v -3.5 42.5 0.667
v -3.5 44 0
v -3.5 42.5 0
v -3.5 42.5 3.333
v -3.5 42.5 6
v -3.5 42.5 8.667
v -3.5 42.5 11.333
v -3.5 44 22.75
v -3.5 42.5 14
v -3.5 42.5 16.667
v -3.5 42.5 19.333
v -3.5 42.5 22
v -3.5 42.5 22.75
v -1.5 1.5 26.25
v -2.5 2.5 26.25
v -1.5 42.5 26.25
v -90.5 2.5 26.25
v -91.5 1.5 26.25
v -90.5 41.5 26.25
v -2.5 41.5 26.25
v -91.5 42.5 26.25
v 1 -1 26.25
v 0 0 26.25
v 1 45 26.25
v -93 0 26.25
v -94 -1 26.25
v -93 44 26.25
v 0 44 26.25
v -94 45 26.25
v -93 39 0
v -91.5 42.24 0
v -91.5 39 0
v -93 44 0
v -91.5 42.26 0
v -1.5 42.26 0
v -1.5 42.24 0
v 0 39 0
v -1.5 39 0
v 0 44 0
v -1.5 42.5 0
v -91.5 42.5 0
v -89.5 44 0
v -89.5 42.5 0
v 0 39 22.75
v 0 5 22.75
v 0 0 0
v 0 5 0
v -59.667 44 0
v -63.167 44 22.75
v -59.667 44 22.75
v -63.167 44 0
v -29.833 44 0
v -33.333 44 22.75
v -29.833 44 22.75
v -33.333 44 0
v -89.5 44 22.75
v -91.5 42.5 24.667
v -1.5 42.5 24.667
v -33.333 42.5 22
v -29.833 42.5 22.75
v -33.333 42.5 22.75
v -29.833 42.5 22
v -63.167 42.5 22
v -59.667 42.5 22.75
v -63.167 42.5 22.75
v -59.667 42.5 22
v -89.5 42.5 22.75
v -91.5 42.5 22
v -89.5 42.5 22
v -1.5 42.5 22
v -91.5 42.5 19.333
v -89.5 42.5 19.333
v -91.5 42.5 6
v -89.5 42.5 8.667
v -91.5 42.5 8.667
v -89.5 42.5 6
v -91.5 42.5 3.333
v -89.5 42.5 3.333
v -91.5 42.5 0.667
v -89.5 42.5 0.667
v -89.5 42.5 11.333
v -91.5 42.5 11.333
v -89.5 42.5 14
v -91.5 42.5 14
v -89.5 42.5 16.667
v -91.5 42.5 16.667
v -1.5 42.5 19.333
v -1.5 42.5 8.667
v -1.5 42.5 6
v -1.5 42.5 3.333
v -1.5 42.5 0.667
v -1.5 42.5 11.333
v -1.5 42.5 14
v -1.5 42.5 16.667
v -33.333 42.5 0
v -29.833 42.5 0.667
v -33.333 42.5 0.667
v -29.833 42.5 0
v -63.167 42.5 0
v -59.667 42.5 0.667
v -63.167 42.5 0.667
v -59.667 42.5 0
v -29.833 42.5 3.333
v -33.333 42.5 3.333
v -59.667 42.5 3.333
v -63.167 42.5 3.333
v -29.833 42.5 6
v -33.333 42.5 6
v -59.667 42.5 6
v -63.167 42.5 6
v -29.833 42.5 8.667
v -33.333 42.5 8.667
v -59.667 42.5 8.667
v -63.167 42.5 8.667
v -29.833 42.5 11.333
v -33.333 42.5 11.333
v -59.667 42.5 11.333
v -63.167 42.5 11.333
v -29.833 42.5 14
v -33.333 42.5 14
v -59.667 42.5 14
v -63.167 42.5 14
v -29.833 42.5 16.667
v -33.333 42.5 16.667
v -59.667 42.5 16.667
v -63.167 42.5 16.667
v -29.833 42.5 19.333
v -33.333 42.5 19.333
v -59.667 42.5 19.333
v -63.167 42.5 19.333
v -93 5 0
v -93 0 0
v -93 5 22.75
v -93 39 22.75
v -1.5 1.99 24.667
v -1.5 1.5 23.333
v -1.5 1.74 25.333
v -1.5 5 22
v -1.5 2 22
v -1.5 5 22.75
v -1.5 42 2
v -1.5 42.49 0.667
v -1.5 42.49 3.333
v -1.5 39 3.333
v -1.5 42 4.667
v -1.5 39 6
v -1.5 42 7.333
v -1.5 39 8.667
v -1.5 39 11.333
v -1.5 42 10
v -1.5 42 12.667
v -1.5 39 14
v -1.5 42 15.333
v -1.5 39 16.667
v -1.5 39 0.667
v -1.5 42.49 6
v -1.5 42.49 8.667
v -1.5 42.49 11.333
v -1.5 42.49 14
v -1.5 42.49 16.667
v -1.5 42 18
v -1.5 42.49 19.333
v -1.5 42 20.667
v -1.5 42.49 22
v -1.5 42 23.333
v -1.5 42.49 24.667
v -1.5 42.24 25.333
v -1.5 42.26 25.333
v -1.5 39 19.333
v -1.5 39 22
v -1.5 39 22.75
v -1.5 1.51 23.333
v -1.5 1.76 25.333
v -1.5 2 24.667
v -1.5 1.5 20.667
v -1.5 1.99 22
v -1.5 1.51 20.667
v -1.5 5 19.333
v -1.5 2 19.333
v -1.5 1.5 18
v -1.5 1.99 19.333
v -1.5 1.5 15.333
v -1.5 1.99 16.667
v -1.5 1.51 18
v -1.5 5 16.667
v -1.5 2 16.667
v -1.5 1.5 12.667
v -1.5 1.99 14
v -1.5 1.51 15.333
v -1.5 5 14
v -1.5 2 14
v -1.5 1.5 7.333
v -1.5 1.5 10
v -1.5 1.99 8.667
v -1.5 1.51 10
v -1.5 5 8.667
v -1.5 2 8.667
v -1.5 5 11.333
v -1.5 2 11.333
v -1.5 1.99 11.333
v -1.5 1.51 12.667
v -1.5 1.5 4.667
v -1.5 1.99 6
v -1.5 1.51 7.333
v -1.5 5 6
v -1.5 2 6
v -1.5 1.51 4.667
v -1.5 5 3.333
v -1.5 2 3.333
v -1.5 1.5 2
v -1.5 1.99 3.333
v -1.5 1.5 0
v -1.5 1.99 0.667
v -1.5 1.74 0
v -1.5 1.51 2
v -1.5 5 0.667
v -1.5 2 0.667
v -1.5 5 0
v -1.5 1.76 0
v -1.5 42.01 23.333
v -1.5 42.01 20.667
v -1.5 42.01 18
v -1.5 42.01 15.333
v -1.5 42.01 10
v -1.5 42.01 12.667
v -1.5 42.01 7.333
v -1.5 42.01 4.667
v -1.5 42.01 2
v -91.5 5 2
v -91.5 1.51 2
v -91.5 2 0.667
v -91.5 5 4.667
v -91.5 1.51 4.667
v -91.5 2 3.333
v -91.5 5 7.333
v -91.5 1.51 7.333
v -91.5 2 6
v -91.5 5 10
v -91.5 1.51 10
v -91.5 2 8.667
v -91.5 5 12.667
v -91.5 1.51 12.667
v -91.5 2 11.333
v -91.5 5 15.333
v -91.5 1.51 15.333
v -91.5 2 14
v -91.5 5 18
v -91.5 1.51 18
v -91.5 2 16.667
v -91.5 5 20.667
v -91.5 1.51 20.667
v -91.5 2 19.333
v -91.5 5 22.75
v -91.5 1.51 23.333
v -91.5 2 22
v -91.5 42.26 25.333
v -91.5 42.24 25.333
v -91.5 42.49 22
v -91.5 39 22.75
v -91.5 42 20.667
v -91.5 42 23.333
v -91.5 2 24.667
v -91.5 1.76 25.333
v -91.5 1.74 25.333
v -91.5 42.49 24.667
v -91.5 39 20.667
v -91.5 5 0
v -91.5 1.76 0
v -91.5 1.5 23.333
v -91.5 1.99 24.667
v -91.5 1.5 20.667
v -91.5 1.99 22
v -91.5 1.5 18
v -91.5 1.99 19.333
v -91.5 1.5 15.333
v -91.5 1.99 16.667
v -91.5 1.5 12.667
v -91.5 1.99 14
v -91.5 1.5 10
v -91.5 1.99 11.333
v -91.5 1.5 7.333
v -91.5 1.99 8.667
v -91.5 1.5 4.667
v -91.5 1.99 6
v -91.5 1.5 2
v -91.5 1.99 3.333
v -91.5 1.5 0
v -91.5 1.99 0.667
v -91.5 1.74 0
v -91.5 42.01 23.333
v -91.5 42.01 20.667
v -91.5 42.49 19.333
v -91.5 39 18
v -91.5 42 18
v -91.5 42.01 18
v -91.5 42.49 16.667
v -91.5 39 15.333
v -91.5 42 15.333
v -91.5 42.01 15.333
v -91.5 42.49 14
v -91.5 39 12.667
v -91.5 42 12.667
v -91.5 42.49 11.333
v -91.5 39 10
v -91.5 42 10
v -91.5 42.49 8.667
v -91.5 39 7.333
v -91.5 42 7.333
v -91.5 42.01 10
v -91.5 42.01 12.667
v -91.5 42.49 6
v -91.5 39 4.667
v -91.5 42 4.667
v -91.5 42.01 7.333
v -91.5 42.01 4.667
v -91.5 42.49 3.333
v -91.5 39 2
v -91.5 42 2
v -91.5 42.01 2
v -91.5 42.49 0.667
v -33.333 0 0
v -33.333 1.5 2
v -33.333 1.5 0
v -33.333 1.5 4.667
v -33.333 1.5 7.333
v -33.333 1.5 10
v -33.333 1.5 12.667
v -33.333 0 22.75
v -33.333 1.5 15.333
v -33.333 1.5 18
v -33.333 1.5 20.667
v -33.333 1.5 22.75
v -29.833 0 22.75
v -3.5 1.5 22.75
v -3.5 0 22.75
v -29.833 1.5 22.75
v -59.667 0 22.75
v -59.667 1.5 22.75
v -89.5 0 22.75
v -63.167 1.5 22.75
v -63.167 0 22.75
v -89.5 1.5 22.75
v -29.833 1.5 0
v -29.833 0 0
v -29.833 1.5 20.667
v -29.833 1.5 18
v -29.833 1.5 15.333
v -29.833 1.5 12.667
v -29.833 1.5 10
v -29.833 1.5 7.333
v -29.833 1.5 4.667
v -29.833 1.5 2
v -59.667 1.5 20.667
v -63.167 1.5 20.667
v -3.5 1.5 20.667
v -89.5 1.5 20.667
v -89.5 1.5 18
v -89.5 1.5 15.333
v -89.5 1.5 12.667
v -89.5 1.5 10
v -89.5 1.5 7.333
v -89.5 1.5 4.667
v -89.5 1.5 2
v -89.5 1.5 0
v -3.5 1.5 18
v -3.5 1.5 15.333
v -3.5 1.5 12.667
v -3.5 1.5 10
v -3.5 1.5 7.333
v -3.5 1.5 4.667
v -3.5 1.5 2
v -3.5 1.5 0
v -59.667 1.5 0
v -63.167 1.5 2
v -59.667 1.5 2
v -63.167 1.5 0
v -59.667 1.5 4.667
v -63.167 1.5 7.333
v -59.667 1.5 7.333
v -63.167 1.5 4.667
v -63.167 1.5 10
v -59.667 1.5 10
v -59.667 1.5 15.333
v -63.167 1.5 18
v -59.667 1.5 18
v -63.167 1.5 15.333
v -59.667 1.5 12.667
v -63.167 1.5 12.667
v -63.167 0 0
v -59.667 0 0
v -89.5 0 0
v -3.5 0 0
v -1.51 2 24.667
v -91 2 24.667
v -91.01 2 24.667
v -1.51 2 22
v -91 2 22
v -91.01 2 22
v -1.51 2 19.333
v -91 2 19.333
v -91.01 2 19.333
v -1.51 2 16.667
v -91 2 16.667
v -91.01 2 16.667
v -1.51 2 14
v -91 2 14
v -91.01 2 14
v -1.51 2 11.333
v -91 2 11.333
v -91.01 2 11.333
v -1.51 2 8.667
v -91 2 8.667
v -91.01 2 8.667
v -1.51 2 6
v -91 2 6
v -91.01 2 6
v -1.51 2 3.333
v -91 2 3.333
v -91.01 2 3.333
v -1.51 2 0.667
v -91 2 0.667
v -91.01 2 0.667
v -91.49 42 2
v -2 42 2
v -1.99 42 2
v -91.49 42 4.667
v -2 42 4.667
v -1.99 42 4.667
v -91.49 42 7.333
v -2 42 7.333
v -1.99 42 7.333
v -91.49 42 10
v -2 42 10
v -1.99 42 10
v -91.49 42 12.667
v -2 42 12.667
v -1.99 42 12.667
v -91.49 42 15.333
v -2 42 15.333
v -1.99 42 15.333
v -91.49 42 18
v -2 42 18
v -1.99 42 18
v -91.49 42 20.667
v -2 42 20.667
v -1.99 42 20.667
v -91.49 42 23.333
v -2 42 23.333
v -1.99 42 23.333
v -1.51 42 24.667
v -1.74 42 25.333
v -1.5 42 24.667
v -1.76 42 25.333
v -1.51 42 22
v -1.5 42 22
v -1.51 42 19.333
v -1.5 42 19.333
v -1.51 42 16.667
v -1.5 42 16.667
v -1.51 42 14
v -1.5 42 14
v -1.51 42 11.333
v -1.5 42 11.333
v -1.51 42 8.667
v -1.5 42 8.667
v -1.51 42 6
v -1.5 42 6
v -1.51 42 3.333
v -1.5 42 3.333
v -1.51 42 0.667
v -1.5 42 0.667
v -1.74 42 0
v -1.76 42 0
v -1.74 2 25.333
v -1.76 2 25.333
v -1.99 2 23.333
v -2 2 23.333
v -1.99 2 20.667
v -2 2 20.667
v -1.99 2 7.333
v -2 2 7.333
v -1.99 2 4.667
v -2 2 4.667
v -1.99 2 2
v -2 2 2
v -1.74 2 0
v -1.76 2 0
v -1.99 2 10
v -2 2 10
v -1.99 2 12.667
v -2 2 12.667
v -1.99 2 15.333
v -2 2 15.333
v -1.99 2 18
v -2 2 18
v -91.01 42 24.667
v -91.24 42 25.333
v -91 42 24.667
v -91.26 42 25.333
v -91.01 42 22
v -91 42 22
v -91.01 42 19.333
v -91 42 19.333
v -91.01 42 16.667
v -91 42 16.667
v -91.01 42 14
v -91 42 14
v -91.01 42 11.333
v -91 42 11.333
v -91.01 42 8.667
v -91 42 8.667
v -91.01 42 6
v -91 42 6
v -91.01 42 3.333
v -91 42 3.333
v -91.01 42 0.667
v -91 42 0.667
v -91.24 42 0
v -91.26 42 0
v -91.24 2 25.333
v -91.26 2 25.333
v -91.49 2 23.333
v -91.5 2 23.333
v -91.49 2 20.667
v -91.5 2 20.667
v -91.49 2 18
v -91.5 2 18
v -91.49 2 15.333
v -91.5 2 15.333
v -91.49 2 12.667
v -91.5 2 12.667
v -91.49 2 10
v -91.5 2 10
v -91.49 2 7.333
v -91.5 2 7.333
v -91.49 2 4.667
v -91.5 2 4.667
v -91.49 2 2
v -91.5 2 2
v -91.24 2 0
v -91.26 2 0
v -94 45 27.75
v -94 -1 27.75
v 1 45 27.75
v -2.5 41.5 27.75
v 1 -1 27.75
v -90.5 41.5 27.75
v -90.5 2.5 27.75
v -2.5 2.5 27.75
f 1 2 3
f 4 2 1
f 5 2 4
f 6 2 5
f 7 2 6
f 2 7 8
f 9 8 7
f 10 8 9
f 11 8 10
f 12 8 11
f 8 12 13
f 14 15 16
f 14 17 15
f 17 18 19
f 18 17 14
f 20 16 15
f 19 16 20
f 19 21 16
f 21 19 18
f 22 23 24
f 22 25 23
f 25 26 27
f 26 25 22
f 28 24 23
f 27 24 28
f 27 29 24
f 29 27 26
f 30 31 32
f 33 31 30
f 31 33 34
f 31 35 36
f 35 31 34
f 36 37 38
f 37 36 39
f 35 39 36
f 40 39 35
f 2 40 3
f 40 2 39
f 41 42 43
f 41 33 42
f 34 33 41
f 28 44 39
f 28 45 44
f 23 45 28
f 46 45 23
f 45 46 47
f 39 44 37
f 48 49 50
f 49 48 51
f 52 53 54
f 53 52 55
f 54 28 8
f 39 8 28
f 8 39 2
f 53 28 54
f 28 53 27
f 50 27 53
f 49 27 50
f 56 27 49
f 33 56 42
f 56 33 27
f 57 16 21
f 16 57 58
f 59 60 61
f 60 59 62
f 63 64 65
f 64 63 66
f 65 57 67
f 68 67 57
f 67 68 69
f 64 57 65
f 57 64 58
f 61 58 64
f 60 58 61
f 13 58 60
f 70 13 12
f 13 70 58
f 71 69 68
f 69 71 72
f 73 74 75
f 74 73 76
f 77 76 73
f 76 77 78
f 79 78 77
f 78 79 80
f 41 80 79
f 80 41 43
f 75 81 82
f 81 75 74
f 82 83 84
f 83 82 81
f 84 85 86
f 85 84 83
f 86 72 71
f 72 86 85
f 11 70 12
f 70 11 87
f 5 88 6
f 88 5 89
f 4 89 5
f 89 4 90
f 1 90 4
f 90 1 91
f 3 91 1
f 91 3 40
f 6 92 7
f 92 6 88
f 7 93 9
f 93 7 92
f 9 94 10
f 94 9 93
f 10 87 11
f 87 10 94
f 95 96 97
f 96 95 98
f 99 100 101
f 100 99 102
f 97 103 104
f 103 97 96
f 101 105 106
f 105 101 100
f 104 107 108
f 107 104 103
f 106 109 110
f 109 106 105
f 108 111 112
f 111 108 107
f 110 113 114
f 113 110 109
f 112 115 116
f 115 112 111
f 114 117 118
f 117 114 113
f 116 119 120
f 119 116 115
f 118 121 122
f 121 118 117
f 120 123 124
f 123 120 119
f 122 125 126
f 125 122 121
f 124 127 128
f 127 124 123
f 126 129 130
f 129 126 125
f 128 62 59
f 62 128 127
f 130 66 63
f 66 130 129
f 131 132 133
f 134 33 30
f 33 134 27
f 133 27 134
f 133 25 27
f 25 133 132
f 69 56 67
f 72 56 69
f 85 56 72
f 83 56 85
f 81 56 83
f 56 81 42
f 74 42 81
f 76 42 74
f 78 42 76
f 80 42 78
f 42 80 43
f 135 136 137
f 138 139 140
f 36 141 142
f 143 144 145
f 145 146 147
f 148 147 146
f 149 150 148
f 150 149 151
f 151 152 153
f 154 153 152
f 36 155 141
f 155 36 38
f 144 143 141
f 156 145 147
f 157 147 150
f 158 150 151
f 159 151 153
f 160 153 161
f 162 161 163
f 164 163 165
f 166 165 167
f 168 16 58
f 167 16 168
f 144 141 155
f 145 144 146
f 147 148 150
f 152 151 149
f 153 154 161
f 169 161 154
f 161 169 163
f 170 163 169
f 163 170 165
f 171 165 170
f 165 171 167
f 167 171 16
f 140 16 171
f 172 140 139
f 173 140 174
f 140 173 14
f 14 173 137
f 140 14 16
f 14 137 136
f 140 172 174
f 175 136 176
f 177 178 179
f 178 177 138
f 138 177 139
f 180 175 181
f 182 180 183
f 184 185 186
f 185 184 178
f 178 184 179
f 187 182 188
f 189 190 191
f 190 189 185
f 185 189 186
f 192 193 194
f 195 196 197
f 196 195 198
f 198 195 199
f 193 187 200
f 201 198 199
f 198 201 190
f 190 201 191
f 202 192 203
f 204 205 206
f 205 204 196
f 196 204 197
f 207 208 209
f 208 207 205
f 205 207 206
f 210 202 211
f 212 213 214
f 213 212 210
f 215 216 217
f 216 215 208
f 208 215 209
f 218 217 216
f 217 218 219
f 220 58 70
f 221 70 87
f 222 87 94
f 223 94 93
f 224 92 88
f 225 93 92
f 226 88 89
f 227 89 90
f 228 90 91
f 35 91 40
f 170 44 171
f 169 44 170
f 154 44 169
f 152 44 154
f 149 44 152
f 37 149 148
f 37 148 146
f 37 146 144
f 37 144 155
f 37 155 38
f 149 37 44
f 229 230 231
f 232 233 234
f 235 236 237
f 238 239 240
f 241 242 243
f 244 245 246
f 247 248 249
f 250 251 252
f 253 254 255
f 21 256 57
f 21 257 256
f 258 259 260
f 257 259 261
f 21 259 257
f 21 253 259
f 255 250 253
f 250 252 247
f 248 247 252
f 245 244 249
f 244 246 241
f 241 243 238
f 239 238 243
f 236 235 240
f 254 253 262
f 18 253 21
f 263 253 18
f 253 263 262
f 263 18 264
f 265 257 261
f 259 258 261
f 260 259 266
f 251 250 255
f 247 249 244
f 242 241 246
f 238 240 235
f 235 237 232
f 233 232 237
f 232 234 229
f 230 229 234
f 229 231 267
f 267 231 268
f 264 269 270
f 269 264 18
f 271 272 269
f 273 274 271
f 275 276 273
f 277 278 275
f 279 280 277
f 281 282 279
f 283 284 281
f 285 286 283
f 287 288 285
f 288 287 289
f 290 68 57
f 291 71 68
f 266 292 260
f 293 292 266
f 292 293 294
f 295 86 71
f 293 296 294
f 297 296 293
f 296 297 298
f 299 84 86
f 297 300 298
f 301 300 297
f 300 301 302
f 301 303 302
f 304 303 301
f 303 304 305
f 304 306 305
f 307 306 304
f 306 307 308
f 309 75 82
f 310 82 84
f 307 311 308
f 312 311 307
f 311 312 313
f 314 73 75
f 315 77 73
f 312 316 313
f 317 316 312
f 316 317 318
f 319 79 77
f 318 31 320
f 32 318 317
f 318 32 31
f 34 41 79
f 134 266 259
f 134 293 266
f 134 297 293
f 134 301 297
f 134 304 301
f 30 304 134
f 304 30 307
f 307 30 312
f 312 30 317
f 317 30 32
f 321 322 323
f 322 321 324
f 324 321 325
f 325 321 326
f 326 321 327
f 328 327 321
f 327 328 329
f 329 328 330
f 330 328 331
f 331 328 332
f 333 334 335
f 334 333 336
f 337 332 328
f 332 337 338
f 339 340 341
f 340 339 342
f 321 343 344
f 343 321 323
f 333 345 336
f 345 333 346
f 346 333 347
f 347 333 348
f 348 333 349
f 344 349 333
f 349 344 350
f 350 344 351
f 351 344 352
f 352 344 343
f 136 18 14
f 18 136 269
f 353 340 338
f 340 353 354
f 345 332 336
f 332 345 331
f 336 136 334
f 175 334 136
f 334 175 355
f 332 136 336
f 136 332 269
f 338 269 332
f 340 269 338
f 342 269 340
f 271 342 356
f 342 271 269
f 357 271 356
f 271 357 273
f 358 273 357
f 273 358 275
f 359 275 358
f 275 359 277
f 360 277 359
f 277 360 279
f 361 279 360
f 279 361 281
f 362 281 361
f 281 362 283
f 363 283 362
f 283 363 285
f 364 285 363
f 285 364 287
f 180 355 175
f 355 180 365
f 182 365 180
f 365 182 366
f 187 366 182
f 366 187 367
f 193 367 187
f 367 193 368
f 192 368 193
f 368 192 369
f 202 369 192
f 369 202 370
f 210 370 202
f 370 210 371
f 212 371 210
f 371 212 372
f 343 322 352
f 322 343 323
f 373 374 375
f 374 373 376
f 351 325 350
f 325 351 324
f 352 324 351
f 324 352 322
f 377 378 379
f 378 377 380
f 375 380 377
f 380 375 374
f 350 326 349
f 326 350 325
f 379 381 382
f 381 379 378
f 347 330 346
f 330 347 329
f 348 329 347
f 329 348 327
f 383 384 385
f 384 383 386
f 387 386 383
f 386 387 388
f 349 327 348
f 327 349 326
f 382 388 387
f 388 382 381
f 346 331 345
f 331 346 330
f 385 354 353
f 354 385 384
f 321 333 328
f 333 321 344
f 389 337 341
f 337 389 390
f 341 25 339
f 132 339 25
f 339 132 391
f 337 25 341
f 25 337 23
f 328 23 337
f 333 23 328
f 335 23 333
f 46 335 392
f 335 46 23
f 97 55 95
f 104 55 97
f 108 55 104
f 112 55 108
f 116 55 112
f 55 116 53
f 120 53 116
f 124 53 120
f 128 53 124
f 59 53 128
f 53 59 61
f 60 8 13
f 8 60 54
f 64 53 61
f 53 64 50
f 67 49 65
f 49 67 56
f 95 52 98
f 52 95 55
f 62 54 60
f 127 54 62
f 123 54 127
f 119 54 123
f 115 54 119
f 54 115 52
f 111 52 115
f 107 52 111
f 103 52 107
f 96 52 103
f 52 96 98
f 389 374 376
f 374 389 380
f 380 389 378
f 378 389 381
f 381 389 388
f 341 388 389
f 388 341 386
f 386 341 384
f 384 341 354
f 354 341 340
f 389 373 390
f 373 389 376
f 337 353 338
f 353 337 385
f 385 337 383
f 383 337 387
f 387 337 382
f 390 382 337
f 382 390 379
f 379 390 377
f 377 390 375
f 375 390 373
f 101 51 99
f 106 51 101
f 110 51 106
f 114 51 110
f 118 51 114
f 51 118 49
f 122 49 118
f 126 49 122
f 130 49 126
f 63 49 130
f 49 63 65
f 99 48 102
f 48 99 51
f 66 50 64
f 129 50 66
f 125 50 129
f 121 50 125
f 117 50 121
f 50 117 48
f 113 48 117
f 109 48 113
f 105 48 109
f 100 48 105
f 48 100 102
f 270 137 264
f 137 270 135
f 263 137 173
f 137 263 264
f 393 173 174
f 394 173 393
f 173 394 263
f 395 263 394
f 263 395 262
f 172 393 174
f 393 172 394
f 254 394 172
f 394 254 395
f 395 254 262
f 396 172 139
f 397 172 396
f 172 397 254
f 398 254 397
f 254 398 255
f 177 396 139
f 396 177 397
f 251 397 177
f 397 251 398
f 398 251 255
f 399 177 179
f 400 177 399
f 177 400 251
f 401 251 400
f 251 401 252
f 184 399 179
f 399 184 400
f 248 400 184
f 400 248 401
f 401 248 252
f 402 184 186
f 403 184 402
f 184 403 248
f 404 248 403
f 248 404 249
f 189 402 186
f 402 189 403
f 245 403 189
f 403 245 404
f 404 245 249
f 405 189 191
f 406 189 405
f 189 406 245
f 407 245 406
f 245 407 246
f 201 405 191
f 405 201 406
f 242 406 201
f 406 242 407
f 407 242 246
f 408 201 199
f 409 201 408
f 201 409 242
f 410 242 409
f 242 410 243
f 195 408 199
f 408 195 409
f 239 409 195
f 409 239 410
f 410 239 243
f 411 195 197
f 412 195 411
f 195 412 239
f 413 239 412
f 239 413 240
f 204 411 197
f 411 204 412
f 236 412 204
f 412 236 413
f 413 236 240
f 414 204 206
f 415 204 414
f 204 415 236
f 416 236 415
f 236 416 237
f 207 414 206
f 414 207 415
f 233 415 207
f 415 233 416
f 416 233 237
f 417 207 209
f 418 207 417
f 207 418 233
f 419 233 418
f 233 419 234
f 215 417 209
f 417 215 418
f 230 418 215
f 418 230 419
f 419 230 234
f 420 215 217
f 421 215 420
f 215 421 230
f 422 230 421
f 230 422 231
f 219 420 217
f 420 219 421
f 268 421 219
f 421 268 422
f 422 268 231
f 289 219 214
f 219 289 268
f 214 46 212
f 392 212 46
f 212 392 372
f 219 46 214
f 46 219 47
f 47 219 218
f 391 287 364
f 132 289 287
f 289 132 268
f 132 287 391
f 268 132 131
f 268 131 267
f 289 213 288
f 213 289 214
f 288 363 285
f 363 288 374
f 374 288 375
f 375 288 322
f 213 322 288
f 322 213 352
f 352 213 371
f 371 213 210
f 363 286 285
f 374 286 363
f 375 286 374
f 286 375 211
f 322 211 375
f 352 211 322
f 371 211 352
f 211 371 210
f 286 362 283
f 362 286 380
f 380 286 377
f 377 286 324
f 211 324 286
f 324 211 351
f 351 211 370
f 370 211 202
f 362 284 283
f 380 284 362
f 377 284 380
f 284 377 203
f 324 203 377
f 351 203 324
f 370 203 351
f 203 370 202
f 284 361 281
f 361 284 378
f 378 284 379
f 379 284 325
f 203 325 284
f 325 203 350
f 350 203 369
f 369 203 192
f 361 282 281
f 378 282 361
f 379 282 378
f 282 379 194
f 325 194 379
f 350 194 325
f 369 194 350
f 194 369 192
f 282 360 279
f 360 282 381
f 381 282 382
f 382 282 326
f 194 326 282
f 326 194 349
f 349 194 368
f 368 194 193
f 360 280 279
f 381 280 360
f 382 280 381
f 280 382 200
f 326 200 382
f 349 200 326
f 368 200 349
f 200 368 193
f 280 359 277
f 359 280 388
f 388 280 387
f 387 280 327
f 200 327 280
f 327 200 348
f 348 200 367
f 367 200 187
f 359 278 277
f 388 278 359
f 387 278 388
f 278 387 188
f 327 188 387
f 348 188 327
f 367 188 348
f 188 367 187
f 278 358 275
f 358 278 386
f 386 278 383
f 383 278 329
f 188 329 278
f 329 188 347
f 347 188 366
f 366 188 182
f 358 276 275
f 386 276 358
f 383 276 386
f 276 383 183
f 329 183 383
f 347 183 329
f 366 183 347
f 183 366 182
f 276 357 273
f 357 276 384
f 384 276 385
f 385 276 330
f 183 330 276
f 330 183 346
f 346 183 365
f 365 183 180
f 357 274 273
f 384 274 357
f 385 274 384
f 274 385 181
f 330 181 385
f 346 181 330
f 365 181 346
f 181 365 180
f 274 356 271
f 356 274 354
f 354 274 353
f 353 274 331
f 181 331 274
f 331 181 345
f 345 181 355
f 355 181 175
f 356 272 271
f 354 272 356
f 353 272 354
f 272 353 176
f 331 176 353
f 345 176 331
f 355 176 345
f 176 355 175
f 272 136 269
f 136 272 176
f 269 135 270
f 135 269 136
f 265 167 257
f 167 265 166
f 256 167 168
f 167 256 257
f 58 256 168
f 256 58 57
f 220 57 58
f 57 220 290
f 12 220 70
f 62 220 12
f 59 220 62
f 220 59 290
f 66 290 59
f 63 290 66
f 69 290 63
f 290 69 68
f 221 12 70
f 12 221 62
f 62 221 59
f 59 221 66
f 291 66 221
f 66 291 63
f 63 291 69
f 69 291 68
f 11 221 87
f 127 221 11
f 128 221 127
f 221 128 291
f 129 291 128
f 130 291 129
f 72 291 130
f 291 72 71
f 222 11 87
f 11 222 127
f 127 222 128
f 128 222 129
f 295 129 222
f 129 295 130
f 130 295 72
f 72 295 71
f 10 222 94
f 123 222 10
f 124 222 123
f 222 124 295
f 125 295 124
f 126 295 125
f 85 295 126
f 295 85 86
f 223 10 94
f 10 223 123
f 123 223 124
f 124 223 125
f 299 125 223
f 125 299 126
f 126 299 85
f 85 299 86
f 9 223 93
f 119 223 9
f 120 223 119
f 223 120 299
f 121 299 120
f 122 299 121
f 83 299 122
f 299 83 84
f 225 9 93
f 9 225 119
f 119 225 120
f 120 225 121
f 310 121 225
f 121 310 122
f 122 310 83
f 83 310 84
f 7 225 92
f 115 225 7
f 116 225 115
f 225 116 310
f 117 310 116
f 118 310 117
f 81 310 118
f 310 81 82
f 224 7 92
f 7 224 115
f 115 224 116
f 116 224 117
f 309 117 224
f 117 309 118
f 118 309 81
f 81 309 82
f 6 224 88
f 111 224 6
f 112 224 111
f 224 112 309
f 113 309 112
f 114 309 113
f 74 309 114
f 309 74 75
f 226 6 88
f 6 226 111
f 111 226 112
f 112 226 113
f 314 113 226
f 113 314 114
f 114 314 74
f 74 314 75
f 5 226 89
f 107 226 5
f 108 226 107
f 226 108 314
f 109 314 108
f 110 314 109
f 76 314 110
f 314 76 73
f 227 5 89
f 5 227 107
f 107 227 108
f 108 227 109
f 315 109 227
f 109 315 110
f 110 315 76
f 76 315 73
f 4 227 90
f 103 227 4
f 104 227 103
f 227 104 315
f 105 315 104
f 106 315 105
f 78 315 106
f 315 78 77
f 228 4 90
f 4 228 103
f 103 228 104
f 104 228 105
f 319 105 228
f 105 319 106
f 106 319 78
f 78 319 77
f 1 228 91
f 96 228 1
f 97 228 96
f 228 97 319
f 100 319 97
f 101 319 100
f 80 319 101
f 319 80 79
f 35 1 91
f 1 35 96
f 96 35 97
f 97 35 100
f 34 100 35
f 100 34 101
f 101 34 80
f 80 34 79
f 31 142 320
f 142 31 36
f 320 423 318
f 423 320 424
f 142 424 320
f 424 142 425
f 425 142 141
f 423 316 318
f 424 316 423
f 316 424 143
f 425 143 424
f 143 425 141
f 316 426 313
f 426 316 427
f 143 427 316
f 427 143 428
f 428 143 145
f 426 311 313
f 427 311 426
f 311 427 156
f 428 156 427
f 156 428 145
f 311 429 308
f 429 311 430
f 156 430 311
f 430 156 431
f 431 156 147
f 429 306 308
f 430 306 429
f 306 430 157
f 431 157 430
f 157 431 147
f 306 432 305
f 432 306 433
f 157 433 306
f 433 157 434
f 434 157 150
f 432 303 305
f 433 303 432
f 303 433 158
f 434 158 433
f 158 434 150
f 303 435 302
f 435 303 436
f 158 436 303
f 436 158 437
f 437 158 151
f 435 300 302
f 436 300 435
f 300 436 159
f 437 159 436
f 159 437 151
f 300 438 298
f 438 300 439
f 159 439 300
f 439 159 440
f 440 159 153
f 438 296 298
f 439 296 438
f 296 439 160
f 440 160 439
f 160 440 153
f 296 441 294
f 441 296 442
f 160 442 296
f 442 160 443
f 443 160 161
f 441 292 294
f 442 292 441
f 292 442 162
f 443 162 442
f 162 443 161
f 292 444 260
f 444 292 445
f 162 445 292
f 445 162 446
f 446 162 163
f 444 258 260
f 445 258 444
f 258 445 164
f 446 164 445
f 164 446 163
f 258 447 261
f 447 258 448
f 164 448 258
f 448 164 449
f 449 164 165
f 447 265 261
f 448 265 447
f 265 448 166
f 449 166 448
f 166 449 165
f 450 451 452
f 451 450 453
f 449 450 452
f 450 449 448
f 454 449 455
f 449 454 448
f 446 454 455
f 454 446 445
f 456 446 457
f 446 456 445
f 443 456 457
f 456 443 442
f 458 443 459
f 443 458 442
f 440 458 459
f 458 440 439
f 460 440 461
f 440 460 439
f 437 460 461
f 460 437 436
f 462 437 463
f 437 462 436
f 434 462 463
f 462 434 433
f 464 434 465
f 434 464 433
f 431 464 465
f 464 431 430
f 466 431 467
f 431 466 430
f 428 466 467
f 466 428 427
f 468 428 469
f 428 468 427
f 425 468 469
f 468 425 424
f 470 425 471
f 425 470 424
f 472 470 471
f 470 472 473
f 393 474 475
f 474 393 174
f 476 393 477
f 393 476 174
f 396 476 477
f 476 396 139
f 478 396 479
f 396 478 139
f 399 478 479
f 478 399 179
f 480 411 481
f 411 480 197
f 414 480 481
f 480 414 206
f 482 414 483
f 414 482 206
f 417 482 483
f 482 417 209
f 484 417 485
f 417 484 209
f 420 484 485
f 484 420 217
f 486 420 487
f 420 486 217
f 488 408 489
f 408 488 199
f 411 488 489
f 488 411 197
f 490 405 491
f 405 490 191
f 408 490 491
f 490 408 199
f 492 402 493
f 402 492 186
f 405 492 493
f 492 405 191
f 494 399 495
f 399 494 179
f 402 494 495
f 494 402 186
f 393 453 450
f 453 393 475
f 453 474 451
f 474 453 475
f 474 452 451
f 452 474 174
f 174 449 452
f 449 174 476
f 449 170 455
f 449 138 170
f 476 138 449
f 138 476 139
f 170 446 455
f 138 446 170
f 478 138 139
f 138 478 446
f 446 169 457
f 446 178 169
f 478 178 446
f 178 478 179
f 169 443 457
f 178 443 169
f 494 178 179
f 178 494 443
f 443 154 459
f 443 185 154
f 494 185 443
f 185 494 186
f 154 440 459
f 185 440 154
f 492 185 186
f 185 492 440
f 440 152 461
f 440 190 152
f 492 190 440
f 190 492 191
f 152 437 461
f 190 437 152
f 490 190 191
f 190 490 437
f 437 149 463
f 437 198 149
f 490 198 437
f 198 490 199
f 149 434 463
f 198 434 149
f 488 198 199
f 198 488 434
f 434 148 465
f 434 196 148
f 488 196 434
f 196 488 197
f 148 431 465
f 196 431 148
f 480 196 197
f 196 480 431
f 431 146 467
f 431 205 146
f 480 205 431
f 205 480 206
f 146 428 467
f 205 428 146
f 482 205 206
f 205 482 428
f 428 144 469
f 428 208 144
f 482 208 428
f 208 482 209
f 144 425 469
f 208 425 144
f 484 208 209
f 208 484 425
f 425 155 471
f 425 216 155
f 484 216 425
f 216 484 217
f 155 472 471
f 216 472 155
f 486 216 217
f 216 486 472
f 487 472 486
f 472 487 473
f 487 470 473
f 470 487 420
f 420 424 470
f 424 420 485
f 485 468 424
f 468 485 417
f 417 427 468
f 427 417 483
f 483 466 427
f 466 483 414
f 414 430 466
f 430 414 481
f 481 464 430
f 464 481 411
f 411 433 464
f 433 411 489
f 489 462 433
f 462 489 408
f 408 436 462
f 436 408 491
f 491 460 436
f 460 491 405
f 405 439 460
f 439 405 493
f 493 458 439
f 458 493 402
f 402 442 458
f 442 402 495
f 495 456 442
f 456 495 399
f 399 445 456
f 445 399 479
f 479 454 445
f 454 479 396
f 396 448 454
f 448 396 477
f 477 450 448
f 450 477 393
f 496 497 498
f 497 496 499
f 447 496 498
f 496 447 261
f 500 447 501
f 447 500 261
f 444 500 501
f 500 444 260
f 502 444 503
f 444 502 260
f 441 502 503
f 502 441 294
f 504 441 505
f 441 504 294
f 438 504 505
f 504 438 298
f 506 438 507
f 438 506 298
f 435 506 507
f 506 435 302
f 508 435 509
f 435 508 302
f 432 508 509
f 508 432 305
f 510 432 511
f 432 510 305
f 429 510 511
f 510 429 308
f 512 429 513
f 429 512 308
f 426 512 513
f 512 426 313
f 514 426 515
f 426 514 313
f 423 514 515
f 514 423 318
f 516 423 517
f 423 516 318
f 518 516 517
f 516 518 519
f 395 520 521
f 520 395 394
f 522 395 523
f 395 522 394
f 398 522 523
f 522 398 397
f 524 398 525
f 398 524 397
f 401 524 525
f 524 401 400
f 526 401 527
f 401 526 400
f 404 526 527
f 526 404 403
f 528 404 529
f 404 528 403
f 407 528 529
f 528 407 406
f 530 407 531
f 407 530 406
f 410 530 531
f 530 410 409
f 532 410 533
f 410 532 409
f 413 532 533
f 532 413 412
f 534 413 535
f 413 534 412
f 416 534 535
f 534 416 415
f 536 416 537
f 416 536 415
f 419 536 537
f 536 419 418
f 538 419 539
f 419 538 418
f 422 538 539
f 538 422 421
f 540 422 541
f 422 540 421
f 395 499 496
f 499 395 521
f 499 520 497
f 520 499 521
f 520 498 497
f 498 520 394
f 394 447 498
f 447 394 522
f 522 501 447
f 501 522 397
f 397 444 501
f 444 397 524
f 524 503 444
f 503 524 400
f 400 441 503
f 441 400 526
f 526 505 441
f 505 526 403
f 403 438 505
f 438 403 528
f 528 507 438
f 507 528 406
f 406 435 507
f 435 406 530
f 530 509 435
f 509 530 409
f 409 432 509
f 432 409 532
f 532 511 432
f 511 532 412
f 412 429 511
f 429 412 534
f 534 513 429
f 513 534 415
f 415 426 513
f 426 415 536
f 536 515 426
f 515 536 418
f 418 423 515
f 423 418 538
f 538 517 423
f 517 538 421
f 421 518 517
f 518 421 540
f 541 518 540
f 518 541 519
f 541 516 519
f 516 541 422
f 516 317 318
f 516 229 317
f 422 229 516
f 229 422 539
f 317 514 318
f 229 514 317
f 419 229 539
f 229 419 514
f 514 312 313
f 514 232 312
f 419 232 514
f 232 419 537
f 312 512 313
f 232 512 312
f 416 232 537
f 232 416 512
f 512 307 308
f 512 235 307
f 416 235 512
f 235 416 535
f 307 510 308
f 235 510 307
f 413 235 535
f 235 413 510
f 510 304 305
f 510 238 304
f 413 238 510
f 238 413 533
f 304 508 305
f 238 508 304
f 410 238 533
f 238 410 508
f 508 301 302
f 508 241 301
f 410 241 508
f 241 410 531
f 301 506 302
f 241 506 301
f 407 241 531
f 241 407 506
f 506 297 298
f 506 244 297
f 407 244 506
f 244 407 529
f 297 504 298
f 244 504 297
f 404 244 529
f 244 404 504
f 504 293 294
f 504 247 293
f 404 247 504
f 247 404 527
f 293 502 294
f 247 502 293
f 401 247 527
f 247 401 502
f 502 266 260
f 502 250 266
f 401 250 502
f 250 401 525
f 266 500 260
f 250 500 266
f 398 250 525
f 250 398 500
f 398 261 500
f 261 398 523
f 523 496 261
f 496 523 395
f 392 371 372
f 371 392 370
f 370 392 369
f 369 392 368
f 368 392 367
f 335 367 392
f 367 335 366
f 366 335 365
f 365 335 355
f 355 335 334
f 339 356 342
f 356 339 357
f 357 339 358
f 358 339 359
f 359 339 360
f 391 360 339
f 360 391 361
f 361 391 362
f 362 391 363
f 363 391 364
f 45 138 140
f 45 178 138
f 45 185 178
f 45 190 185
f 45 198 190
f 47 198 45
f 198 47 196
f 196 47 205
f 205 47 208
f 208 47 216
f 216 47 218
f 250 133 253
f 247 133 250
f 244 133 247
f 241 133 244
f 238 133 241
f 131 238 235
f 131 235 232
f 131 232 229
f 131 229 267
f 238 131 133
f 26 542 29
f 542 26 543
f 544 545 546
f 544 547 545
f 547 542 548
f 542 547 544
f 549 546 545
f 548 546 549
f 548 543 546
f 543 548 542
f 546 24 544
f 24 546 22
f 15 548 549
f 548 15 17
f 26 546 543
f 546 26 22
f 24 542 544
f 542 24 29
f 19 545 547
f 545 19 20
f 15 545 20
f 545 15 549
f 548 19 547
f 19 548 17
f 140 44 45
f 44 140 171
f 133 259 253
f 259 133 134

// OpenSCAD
// START INPUTS

beds = [
//  [180, 5],
//  [150, 4],
//  [120, 3],
  [90,  2],
];

top_offset = 1; // min 1.5 to cover panel
// verify metal connection size

// materials
lumber_thick = 2 - 0.5;
lumber_width = 4 - 0.5;

good_lumber_thick = 2 - 0.5;
good_lumber_width = 4 - 0.5;

panel_height = 26 + 1/4; // should be 1/3 not 1/2
panel_thickness = 1 / 2;

short_panel_width = 40; // between 36 and 48 - 96 or 120
bed_external_width = short_panel_width + 2 * (panel_thickness + lumber_thick + top_offset);

// END START INPUTS

//panel_height = 25 + 1/3;
//panel_thickness = 1 / 2;

bed_external_height = panel_height + lumber_thick;

function accumulate(input, i=0, acc_sum=[]) =
    i == len(input) == 0 ?
        acc_sum :
        let( sum_i = (i==0 ? input[0]: acc_sum[i-1] + input[i]) )
        accumulate(input, i=i+1, acc_sum = concat(acc_sum, [ sum_i ]) );

module beam(size) {
  length = max(size);
  echo(str("BEAM (",lumber_thick,"x",lumber_width,"): length ",  length, "in."));
  color("brown") {
    cube(size, false);
  }
}

module panel(length) {

//    |       36        |
//    | 12  |
//    1x    1
//    _                 _   C
//  _/ \___/-\___/-\___/ \  B
//    2y    2               A
  echo(str("PANEL: length ",  length, "in."));
  weight = 0.1;
  color("gray") {
    translate([length, 0, 0]) {
      rotate([0,-90,0]) {
        translate([0, -panel_thickness / 2, 0]) {
          linear_extrude(length) {
            polygon([
              [0,0], [0, panel_thickness],
              [panel_height, 0], [panel_height, panel_thickness],
            ]);
          }
        }
      }
    }
  }
}

module panelCorrugated(length) {
  s = 24 / 9 / 2;
  o = (2 + 2/3) / 4;
  off = 0.01;
  ae = 1 / 2 / 2;
  ai = ae - off;
  be = -ae;
  bi = -ai;

  echo(str("PANEL: length ",  length, "in."));

  color("gray") {
    translate([length, 0, 0]) {
      rotate([0,-90,0]) {
        linear_extrude(length) {
          polygon([
            [s * 0  + 0, off], [s * 0  + o, ae], [s * 1  + o, bi], [s * 2  + o, ae], [s * 3  + o, bi], [s * 4  + o, ae], [s * 5  + o, bi], [s * 6  + o, ae], [s * 7  + o, bi], [s * 8  + o, ae], [s * 9  + o, bi], [s * 10 + o, ae], [s * 11 + o, bi], [s * 12 + o, ae], [s * 13 + o, bi], [s * 14 + o, ae], [s * 15 + o, bi], [s * 16 + o, ae], [s * 17 + o, bi], [s * 18 + o, ae], [s * 19 + 0, off], [s * 19 + 0, -off], [s * 18 + o, ai], [s * 17 + o, be], [s * 16 + o, ai], [s * 15 + o, be], [s * 14 + o, ai], [s * 13 + o, be], [s * 12 + o, ai], [s * 11 + o, be], [s * 10 + o, ai], [s *  9 + o, be], [s *  8 + o, ai], [s *  7 + o, be], [s *  6 + o, ai], [s *  5 + o, be], [s *  4 + o, ai], [s *  3 + o, be], [s *  2 + o, ai], [s *  1 + o, be], [s *  0 + o, ai], [s *  0 + 0, -off]
          ]);
        }
      }
    }
  }
}

for(b = [1:1:len(beds)]) {

  long_panel_width = beds[b-1][0];
  bedexternalw = long_panel_width + 2 * (lumber_thick + top_offset);
  posts = beds[b-1][1];

  echo(str("Size External: ", bedexternalw, "x", bed_external_width, "x", bed_external_height, " (internal ", long_panel_width, "x", short_panel_width, "x", panel_height, ", area ", (long_panel_width*panel_height/12/12) ," sqft., volume ", (bedexternalw * bed_external_width * bed_external_height / 12 / 12 / 12) ," cf)"));
  dist = (long_panel_width + 2 * lumber_thick - lumber_width) / (posts + 1);
  echo(str("Distance between posts: centerline ", dist, " in, spacing ", (dist - lumber_width), " in"));

  scale([-1, 1, 1]) {
    translate([0, (bed_external_height + 40)*(b-1), 0]) {
      // panels parallel
      translate([lumber_thick, lumber_thick + panel_thickness / 2, 0]) {
        panelCorrugated(long_panel_width);
      }
      translate([lumber_thick, lumber_thick + panel_thickness / 2 + panel_thickness + short_panel_width, 0]) {
        panelCorrugated(long_panel_width);
      }

      // panels ortho
      translate([lumber_thick + panel_thickness / 2, lumber_thick + panel_thickness, 0]) {
        rotate([0, 0, 90]) {
          panelCorrugated(short_panel_width);
        }
      }
      translate([lumber_thick - panel_thickness / 2 + long_panel_width, lumber_thick + panel_thickness, 0]) {
        rotate([0, 0, 90]) {
          panelCorrugated(short_panel_width);
        }
      }

      // vertical beams parallel
      dist3 = long_panel_width + 2 * lumber_thick - lumber_width;
      translate([0, 0, 0]) {
        beam([lumber_width, lumber_thick, panel_height]);
      }
      translate([dist3, 0, 0]) {
        beam([lumber_width, lumber_thick, panel_height]);
      }

      translate([0, short_panel_width + 2 * panel_thickness + lumber_thick, 0]) {
        translate([0, 0, 0]) {
          beam([lumber_width, lumber_thick, panel_height]);
        }
        translate([dist3, 0, 0]) {
          beam([lumber_width, lumber_thick, panel_height]);
        }
      }


      // vertical beams orthogonal
      dist2 = long_panel_width + lumber_thick;
      translate([0, lumber_thick, 0]) {
        beam([lumber_thick, lumber_width, panel_height]);
      }
      translate([dist2, lumber_thick, 0]) {
        beam([lumber_thick, lumber_width, panel_height]);
      }

      translate([0, short_panel_width + 2 * panel_thickness - lumber_width + lumber_thick, 0]) {
        translate([0, 0, 0]) {
          beam([lumber_thick, lumber_width, panel_height]);
        }
        translate([dist2, 0, 0]) {
          beam([lumber_thick, lumber_width, panel_height]);
        }
      }

      // horizontal beams parallel
      len1 = long_panel_width + 2 * lumber_thick + 2 * top_offset;
      translate([-top_offset, -top_offset, panel_height]) {
        beam([len1, good_lumber_width, good_lumber_thick]);
      }
      translate([-top_offset, short_panel_width + 2 * lumber_thick + 2 * panel_thickness + top_offset - good_lumber_width, panel_height]) {
        beam([len1, good_lumber_width, good_lumber_thick]);
      }

      // horizontal beams ortho
      len2 = short_panel_width + 2 * lumber_thick + 2 * panel_thickness + 2 * top_offset;
      translate([-top_offset, -top_offset, panel_height]) {
        beam([good_lumber_width, len2, good_lumber_thick]);
      }
      translate([long_panel_width + 2 * lumber_thick + top_offset - good_lumber_width, -top_offset, panel_height]) {
        beam([good_lumber_width, len2, good_lumber_thick]);
      }

      // border beams parallel
      len3 = long_panel_width + 2 * lumber_thick - 2 * lumber_width;
      translate([lumber_width, 0, panel_height - lumber_width]) {
        beam([len3, lumber_thick, lumber_width]);
      }
      translate([lumber_width, short_panel_width + 2 * panel_thickness + lumber_thick, panel_height - lumber_width]) {
        beam([len3, lumber_thick, lumber_width]);
      }

      // border beams ortho
      len4 = short_panel_width + 2 * panel_thickness - 2 * lumber_width ;
      translate([0, lumber_thick + lumber_width, panel_height - lumber_width]) {
        beam([lumber_thick, len4, lumber_width]);
      }
      translate([long_panel_width + lumber_thick, lumber_thick + lumber_width, panel_height - lumber_width]) {
        beam([lumber_thick, len4, lumber_width]);
      }

      // posts
      len5 = panel_height - lumber_width;
      for(i = [1:1:posts]) {
        translate([i * dist, 0, 0]) {
          beam([lumber_width, lumber_thick, len5]);
        }
        translate([i * dist, short_panel_width + 2 * panel_thickness + lumber_thick, 0]) {
          beam([lumber_width, lumber_thick, len5]);
        }
      }
    }
  }
}
// echo(str("TOTAL BEAM ", beam_tot / 12, " ft"));
// echo(str("TOTAL PANEL ", panel_tot / 12, " ft"));

/*

decide how to screw them together
decide rules for posts
decide width
split first in 2?
decide offset

*/
